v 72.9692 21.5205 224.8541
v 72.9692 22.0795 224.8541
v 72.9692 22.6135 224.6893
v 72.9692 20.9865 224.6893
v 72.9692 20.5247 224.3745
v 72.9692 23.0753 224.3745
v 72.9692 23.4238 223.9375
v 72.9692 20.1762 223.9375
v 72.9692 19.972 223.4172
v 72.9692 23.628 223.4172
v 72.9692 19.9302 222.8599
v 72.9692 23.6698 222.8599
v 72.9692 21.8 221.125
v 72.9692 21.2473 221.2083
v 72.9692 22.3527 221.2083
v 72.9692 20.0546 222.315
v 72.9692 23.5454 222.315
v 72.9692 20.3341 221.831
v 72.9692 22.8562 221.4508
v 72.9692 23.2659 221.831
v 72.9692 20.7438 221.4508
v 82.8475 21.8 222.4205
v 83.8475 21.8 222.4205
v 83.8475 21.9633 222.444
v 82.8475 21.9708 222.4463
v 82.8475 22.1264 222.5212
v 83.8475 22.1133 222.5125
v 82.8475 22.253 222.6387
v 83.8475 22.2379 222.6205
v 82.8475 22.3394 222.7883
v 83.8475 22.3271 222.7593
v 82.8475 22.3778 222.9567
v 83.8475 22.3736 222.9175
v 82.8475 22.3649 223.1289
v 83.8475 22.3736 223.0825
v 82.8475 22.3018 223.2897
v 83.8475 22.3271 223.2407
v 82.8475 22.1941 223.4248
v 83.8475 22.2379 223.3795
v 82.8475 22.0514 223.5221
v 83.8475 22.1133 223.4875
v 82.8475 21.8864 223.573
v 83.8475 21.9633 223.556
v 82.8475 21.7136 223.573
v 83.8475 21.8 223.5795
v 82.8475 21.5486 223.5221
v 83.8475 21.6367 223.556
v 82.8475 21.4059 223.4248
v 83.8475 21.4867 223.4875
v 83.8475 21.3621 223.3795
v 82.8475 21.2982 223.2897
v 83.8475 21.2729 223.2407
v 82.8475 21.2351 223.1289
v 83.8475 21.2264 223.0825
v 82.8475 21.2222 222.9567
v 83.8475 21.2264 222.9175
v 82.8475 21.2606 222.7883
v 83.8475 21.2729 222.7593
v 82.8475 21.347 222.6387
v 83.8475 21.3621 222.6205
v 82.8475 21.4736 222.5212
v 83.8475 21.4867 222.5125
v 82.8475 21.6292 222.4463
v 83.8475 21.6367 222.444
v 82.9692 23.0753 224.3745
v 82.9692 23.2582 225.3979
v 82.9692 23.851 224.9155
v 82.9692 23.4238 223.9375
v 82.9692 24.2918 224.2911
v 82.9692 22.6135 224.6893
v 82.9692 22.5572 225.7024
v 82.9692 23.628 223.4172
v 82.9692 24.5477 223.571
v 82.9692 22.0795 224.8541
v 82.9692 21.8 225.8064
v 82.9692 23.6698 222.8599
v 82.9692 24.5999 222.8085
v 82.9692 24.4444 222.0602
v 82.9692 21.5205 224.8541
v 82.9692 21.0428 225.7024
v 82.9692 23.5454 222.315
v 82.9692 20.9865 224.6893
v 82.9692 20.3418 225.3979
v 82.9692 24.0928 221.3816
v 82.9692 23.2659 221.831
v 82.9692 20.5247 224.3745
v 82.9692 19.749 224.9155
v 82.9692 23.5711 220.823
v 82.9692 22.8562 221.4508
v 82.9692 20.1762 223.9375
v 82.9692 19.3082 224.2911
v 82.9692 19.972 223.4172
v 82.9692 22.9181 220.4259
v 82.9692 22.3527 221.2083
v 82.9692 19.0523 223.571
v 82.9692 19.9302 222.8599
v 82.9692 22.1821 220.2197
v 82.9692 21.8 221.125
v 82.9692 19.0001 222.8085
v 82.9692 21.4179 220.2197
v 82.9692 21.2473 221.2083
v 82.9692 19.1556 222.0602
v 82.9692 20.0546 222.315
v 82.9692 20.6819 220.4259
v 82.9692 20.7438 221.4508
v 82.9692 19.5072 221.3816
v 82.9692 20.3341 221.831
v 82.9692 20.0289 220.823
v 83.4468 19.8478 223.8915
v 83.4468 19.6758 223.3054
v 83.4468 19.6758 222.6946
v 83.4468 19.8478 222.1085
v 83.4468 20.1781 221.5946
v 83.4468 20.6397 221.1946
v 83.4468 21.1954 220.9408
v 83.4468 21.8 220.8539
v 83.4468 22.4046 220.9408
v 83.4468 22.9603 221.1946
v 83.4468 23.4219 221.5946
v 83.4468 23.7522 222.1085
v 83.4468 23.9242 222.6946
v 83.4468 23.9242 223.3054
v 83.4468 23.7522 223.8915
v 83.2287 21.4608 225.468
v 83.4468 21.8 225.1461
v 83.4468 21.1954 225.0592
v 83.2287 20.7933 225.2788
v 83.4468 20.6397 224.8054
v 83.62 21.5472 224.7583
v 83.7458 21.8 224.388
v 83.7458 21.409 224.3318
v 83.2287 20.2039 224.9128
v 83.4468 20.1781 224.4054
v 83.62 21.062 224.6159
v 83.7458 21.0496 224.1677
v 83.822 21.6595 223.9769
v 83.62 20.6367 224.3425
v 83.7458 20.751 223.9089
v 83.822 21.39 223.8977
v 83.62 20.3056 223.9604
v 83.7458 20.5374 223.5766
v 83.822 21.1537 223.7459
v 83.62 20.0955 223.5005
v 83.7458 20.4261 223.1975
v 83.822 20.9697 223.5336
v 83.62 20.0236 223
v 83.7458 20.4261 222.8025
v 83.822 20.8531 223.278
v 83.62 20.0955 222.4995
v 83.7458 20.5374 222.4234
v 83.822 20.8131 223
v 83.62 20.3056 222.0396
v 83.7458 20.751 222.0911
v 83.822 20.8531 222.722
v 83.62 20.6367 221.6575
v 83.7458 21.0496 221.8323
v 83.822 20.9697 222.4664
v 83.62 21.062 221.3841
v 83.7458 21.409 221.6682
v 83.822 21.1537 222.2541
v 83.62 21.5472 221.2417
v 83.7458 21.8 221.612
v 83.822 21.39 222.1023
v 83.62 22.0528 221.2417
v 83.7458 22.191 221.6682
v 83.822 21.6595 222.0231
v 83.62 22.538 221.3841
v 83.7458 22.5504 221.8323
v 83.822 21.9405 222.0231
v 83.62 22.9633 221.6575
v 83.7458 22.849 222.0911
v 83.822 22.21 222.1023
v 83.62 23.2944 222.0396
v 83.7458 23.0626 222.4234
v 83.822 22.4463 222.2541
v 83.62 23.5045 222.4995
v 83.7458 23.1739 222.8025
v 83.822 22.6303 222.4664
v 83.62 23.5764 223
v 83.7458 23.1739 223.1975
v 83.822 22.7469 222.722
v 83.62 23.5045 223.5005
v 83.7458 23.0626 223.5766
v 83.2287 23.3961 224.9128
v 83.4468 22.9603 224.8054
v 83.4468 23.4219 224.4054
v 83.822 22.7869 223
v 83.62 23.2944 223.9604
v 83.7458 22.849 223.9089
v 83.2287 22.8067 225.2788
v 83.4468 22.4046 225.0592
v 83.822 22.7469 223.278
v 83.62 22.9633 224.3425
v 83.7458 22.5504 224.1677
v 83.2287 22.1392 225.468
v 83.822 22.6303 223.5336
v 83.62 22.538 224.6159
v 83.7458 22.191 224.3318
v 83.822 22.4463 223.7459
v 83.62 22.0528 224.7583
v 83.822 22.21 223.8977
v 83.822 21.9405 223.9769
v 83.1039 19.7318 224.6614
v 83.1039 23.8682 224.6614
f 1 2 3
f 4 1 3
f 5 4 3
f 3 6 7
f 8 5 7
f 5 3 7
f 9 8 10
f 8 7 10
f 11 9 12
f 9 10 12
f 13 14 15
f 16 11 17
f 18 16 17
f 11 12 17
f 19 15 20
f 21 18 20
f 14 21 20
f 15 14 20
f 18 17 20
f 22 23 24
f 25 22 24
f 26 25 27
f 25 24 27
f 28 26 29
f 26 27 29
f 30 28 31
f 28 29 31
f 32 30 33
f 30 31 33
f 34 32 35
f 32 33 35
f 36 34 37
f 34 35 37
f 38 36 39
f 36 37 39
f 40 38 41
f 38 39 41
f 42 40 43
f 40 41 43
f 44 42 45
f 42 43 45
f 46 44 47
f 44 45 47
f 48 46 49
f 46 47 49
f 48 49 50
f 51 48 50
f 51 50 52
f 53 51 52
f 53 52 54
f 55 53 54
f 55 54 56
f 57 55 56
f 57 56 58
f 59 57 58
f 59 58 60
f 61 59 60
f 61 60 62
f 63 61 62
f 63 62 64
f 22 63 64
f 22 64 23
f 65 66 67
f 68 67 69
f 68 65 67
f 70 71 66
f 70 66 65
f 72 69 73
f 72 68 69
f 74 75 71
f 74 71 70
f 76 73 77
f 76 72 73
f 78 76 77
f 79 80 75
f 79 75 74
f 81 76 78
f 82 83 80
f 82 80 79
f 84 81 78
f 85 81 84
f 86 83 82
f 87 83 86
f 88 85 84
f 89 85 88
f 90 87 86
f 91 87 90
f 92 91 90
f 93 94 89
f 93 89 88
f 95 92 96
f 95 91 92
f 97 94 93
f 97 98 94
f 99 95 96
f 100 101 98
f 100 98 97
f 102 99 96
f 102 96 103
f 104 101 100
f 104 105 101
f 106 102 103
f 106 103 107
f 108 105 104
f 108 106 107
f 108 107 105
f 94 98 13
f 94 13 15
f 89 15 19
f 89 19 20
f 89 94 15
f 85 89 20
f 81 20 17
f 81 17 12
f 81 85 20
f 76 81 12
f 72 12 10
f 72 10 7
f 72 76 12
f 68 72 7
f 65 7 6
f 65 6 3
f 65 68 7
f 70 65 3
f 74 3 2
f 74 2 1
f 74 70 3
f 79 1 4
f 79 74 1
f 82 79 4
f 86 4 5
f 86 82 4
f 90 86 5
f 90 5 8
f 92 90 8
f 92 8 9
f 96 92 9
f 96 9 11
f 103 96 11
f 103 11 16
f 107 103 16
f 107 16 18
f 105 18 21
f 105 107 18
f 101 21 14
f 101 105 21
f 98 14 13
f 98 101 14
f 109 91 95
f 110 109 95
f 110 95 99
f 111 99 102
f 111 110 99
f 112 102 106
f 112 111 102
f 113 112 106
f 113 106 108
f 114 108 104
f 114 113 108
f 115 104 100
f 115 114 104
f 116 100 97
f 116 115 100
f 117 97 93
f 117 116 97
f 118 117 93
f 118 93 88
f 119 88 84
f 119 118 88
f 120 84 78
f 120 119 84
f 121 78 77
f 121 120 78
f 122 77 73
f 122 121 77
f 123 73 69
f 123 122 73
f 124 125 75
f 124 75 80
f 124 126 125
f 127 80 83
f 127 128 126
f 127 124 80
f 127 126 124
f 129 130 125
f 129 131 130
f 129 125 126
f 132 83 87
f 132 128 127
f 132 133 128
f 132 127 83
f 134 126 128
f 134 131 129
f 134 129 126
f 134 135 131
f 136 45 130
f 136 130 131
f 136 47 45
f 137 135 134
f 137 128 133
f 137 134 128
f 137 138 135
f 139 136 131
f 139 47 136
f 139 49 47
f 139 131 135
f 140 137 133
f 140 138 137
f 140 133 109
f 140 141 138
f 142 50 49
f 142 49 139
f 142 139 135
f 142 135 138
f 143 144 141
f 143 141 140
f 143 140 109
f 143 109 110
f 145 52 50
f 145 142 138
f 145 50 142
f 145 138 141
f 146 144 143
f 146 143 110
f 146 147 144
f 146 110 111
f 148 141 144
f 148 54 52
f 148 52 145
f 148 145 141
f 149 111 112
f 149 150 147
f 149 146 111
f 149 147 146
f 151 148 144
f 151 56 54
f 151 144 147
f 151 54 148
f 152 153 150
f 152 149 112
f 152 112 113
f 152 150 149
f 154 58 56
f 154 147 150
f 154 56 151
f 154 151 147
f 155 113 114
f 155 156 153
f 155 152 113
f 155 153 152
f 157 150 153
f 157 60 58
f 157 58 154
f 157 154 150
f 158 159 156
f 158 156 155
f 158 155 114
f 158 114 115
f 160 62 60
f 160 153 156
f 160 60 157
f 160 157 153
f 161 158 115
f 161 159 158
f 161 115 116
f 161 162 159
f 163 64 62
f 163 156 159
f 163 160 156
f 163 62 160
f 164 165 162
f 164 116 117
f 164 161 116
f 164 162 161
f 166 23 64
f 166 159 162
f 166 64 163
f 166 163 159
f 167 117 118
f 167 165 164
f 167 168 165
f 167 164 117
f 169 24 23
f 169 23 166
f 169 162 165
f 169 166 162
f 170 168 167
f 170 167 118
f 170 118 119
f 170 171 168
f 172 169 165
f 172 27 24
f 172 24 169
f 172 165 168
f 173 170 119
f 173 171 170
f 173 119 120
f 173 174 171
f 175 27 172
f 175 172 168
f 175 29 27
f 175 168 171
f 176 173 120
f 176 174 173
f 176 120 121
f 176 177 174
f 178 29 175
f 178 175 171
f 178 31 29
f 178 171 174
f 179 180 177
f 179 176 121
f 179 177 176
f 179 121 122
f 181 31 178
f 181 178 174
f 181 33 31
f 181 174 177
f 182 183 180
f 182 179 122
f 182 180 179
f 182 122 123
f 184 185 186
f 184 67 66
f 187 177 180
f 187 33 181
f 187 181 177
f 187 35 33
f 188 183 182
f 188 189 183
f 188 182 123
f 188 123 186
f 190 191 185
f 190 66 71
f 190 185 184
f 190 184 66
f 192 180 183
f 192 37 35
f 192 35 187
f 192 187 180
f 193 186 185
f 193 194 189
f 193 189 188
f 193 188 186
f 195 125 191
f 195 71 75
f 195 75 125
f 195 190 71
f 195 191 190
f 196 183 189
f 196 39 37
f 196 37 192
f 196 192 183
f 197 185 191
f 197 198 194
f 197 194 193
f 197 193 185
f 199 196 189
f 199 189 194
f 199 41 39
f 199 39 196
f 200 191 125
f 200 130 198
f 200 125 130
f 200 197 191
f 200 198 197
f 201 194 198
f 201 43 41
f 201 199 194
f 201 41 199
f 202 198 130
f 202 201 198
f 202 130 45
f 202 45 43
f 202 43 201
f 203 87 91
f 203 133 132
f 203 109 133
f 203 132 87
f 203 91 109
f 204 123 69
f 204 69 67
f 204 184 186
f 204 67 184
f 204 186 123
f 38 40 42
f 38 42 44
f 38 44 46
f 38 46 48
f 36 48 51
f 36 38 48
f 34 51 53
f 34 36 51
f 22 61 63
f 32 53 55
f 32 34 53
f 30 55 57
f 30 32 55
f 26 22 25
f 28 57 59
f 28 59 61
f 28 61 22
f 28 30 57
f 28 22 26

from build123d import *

# Parameters (mm, degrees)
SKETCH1_R           = 1.875
BOSS_EXTRUDE1_DEPTH = 10
SKETCH3_R           = 0.579460837
CUT_EXTRUDE1_DEPTH  = 1


with BuildPart() as part:
    # Sketch1 → Boss-Extrude1 (new body)
    with BuildSketch(Plane(origin=(82.969208633, 0, 0), x_dir=(0, 0, -1), z_dir=(1, 0, 0))):
        with Locations((-223, 21.8)):
            Circle(SKETCH1_R)
    extrude(amount=-BOSS_EXTRUDE1_DEPTH)

    # Sketch2 → Revolve1 (revolve)
    with BuildSketch(Plane.XY.offset(223)):
        with BuildLine():
            Line((83.847534734, 21.8), (82.969208633, 21.8))
            Line((82.969208633, 21.8), (82.969208633, 19.925))
            Line((82.969208633, 19.925), (82.969208633, 18.993573117))
            ThreePointArc((82.969208633, 18.993573117), (83.620019841, 20.02358109), (83.847534734, 21.220539163))
            Line((83.847534734, 21.220539163), (83.847534734, 21.8))
        make_face()
    revolve(axis=Axis((82.969208633, 21.8, 223), (1, 0, 0)))

    # Sketch3 → Cut-Extrude1 (cut)
    with BuildSketch(Plane(origin=(83.847534734, 0, 0), x_dir=(0, 0, -1), z_dir=(1, 0, 0))):
        with Locations((-223, 21.8)):
            Circle(SKETCH3_R)
    extrude(amount=-CUT_EXTRUDE1_DEPTH, mode=Mode.SUBTRACT)


solid = part.part
